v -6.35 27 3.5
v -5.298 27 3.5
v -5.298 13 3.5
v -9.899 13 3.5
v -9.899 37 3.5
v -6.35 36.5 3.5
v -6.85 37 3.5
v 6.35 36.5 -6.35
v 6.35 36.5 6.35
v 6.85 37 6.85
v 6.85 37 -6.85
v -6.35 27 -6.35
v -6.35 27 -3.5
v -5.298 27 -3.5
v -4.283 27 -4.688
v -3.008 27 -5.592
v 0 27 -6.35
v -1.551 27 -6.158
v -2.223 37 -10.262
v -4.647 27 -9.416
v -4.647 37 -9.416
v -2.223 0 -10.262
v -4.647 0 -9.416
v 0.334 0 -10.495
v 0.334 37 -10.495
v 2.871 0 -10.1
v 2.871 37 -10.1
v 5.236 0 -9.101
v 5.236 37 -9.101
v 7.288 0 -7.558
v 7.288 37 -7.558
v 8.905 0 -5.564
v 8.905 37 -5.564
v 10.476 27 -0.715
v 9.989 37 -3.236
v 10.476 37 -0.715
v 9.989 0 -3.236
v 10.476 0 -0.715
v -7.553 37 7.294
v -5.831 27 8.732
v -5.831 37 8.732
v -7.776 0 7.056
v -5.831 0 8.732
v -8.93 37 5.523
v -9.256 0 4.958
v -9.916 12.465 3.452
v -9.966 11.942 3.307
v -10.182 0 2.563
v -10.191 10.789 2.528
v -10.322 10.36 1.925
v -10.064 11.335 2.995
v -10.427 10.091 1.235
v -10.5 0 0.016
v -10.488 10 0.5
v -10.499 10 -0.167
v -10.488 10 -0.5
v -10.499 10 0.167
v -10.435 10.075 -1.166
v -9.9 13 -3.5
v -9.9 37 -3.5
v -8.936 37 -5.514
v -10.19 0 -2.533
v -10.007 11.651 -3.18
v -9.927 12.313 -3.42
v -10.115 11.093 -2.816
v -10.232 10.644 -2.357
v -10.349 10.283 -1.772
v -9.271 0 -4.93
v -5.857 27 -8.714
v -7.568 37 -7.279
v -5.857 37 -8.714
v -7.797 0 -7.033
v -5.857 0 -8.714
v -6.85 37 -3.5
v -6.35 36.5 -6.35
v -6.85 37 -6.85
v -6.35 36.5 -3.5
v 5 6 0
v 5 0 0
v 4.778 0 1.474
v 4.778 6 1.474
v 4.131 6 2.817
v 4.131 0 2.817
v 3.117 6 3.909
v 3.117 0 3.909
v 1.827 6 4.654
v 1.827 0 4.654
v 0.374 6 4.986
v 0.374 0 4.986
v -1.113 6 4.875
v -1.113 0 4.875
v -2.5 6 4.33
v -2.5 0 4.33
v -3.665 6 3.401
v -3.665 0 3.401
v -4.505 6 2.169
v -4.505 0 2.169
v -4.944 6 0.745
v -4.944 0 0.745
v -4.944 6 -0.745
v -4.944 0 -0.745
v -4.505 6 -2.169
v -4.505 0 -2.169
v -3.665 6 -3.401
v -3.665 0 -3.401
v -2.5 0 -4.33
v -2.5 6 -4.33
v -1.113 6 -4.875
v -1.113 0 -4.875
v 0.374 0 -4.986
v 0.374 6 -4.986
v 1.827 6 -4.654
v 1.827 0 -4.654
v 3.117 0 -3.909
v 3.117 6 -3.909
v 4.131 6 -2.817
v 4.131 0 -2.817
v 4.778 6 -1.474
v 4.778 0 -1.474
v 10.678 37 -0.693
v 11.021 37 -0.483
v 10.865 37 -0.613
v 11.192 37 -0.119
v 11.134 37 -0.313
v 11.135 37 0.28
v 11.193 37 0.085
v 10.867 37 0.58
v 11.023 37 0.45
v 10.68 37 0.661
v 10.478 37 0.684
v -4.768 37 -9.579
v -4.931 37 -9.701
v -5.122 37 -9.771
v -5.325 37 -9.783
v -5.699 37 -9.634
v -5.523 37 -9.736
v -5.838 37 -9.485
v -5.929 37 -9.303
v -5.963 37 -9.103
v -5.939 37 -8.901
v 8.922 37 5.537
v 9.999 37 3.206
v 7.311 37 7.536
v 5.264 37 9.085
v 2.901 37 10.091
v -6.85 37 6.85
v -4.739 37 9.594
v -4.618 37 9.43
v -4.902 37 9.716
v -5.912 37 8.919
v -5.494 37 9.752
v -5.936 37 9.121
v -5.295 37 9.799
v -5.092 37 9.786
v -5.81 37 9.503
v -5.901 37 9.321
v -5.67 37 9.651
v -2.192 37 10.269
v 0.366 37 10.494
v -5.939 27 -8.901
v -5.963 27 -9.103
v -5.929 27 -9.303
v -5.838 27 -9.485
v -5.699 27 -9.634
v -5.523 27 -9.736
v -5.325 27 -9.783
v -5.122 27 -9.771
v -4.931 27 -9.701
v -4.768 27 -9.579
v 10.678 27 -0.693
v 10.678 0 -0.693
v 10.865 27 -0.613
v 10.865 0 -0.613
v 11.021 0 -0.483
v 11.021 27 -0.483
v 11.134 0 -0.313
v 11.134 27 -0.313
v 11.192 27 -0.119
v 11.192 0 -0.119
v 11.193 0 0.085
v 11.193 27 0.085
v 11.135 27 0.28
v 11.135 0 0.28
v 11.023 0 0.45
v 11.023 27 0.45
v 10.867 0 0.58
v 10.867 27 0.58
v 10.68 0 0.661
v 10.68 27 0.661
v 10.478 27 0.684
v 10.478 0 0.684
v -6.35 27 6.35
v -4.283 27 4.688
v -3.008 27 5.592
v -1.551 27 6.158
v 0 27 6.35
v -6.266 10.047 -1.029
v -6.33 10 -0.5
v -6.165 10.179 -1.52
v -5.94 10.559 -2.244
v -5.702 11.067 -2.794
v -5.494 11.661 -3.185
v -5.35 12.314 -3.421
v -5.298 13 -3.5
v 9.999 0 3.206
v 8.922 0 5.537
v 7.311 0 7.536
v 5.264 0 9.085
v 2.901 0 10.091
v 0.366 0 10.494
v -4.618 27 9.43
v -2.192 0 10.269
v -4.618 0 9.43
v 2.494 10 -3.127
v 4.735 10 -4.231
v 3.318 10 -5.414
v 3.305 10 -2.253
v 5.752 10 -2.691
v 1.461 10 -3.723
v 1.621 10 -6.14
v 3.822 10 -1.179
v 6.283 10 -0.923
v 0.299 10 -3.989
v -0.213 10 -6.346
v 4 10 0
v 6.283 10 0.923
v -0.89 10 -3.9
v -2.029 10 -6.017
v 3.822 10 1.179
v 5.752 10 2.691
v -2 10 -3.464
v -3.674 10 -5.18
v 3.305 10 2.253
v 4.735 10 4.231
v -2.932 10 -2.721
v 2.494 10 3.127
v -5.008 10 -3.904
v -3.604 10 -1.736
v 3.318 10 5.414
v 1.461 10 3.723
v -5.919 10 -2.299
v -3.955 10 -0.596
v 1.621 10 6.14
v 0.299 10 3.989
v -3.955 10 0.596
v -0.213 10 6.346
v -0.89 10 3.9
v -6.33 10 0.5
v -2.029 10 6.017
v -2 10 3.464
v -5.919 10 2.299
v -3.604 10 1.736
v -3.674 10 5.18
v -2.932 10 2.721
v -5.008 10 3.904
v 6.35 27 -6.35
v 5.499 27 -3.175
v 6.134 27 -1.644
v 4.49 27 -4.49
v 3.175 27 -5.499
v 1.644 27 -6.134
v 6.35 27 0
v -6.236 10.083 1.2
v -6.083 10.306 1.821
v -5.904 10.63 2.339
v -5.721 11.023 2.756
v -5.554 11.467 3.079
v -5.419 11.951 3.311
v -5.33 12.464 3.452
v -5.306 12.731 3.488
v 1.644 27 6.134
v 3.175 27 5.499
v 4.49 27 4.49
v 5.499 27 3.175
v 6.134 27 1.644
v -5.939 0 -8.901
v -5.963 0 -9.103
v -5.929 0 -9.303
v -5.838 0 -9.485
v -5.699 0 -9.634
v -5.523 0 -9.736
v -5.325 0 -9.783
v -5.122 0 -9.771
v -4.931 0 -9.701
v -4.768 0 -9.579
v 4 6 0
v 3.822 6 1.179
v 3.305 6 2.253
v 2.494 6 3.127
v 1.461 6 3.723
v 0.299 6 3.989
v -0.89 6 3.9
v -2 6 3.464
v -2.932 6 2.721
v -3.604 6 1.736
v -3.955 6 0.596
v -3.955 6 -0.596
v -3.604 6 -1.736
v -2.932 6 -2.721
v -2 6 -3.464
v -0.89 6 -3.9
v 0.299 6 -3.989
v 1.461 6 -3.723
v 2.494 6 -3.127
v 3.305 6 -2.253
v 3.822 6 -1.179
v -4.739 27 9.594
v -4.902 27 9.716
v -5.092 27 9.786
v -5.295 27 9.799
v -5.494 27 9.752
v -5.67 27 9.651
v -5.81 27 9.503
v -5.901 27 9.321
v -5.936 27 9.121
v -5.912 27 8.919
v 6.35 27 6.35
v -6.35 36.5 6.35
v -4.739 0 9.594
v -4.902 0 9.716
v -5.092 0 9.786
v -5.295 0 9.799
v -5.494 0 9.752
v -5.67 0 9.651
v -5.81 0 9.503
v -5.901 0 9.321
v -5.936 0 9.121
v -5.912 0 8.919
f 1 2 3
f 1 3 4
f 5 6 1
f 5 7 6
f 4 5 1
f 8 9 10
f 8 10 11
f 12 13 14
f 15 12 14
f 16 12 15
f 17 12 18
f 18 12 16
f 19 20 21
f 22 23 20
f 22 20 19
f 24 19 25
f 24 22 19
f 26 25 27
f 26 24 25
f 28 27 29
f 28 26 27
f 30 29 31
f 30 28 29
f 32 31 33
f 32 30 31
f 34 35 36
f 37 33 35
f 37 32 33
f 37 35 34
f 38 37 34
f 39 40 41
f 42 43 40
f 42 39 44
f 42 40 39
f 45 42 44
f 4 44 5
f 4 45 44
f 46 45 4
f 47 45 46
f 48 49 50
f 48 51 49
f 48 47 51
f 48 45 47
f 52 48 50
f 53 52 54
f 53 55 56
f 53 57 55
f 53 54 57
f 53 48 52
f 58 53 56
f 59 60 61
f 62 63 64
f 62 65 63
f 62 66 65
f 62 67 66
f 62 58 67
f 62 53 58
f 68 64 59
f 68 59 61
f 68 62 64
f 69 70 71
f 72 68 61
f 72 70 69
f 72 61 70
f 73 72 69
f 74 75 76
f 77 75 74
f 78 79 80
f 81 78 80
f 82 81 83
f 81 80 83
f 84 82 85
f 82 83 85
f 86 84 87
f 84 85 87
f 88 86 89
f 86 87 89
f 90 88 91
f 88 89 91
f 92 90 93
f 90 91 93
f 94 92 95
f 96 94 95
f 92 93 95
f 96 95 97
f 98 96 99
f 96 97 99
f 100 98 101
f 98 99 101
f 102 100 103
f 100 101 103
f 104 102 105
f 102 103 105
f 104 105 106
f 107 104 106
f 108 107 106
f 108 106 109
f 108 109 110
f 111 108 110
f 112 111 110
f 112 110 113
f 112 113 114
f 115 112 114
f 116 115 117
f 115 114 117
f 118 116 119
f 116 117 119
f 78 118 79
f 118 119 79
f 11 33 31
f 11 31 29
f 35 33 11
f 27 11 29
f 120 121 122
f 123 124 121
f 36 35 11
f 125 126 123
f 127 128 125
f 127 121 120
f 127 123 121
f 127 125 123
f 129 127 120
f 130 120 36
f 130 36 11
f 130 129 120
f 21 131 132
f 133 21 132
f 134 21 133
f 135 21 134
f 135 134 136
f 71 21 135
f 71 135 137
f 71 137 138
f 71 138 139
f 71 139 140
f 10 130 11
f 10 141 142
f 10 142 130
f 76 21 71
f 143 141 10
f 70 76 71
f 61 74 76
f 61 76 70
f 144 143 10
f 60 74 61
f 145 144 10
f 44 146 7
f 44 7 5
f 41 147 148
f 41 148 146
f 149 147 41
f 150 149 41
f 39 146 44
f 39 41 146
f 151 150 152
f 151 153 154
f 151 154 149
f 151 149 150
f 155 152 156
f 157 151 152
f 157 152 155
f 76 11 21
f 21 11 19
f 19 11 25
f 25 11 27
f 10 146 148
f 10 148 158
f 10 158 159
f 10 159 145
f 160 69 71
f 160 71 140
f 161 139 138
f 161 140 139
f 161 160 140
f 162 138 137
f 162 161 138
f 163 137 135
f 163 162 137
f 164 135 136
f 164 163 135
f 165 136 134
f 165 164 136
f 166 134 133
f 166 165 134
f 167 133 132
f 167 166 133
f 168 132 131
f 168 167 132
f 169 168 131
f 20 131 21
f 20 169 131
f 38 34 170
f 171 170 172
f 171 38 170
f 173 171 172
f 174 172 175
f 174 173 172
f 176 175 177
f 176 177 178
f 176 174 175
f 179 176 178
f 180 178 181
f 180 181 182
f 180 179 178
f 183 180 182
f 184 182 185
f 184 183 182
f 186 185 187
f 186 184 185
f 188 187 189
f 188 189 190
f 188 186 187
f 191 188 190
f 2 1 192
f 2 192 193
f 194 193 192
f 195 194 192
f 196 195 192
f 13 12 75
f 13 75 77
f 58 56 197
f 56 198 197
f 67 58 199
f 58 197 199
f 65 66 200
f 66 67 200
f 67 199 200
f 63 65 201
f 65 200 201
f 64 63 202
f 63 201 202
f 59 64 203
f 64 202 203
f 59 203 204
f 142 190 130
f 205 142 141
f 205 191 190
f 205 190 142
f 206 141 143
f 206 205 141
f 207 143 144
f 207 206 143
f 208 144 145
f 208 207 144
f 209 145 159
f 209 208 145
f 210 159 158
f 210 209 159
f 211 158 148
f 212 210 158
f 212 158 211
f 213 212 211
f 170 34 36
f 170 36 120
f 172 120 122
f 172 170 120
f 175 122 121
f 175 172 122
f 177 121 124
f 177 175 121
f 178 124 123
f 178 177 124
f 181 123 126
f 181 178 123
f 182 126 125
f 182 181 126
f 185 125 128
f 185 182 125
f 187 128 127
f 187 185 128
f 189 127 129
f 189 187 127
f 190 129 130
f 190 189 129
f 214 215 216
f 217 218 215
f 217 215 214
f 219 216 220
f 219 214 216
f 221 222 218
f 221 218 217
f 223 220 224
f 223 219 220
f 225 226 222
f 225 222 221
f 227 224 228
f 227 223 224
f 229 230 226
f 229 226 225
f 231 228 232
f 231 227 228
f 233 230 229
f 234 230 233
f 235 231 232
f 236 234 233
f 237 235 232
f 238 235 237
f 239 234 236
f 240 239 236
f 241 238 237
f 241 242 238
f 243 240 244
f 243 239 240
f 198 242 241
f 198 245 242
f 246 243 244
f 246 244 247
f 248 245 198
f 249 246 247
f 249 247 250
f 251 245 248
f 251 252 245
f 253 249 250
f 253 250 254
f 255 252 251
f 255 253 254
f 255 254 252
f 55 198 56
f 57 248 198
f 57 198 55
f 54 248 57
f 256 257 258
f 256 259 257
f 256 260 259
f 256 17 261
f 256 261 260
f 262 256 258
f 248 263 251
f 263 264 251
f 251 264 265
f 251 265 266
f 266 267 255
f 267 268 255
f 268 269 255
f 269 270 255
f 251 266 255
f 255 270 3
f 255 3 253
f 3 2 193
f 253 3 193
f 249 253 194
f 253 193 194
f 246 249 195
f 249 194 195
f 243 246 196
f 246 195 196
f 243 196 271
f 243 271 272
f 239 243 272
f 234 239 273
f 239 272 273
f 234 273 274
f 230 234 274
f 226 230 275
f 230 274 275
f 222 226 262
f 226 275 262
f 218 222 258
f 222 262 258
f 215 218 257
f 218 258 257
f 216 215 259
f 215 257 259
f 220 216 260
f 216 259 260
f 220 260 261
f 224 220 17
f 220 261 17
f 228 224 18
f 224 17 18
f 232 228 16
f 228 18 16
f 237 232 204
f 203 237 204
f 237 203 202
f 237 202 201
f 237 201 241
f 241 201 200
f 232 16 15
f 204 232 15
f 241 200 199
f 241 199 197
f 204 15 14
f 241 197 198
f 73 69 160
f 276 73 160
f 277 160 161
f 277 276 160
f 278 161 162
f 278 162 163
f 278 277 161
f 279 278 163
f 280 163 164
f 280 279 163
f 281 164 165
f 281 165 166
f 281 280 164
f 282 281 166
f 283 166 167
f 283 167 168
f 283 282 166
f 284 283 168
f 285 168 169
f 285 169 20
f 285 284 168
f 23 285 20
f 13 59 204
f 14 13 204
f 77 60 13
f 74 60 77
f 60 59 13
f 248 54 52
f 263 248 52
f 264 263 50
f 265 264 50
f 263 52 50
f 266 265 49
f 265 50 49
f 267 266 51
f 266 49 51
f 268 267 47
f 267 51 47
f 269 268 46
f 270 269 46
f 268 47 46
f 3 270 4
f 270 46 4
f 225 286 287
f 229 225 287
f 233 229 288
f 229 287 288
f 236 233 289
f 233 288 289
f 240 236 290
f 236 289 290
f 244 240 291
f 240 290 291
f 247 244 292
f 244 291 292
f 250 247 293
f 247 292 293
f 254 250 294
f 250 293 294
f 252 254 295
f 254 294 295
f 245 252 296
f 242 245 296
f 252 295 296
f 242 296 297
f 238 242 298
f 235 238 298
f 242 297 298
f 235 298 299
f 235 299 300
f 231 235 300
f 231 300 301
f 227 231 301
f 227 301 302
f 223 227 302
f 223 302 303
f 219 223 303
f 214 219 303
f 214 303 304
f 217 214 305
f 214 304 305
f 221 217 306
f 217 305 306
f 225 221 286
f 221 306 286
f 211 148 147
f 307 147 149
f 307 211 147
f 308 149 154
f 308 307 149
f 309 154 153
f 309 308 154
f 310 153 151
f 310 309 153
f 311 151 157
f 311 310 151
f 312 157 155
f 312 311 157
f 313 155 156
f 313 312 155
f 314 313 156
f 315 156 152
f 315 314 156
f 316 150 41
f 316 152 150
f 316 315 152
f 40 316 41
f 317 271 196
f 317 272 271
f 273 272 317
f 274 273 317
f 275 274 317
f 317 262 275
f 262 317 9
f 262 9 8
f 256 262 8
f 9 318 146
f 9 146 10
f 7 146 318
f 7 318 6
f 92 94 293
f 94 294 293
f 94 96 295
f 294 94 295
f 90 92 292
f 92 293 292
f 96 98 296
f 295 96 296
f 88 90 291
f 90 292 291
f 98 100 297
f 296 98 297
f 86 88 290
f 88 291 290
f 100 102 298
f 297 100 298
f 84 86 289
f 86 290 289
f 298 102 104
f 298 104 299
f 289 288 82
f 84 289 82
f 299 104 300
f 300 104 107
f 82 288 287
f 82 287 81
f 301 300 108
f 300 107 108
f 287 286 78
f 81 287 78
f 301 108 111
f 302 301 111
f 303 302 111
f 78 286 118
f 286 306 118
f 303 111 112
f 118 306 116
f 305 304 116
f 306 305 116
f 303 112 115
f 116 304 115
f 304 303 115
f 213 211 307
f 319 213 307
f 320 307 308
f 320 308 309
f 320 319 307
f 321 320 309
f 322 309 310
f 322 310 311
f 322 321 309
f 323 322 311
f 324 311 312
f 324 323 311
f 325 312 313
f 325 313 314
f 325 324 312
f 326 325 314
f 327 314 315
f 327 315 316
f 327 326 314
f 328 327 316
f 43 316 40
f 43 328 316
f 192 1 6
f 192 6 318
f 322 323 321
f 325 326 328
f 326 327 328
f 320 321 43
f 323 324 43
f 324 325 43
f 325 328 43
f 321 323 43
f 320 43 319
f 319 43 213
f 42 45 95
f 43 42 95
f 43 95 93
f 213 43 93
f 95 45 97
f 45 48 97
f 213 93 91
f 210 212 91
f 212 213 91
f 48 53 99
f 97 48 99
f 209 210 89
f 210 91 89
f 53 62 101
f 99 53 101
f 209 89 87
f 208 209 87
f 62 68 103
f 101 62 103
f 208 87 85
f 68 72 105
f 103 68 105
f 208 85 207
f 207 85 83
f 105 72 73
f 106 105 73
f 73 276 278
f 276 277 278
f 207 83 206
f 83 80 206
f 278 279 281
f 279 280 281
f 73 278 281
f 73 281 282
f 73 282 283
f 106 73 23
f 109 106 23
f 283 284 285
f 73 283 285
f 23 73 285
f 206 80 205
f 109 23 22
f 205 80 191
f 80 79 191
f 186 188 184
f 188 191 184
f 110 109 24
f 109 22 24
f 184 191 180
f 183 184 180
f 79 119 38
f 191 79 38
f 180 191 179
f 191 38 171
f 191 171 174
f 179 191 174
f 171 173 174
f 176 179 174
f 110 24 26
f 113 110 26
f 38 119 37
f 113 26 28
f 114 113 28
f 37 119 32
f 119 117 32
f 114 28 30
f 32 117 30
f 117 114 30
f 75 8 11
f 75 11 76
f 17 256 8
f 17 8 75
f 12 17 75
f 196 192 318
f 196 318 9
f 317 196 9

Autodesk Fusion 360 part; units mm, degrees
sketch "Sketch1" plane through (0, 0, 0) normal (0, 1, 0) x (1, 0, 0) in component "SwitchSpacer"
  arc A0 (-5.8311, -8.732) -> (-5.8573, 8.7145) centre (0, 0) cw
  arc A1 (-4.6183, -9.4298) -> (-5.8311, -8.732) centre (-5.2363, -9.1011) cw
  line L0 (-20, 3.982) -> (0, 3.982)
  arc A2 (10.4756, 0.7154) -> (10.4777, -0.6839) centre (10.5, 0.0158) cw
  arc A3 (-4.6466, 9.4159) -> (10.4756, 0.7154) centre (0, 0) cw
  arc A4 (10.4777, -0.6839) -> (-4.6183, -9.4298) centre (0, 0) cw
  arc A5 (-5.8573, 8.7145) -> (-4.6466, 9.4159) centre (-5.2637, 9.0854) cw
  line L1 (-20, -4.0237) -> (-20, 3.982)
  circle A6 centre (0, 0) radius 8
  line L2 (0, 3.982) -> (0, -4.0237)
  line L3 (0, -4.0237) -> (-20, -4.0237)
  circle A7 centre (0, 0) radius 5
  circle A8 centre (0, 0) radius 4
  dimension "d8" = 10
  dimension "d9" = 8
extrude "Extrude8" add sketch "Sketch1" along normal blind 27 contours A0 A1 L0 A2 A3 A4 A5 A6 L3 | A0 L0 A6 L3 | L0 A6 L3 A7 | L0 A6 L3 A7 | L0 L2 L3 A7 A8 | L0 L2 L3 A7 A8 in component "SwitchSpacer"
sketch "Sketch2" plane through (0, 27, 0) normal (0, 1, 0) x (-1, 0, 0) in component "SwitchSpacer"
  circle A0 centre (0, 0) radius 4
  line L0 (6.35, 6.35) -> (-6.35, 6.35)
  line L1 (-6.35, 6.35) -> (-6.35, -6.35)
  line L2 (-6.35, -6.35) -> (6.35, -6.35)
  line L3 (6.35, -6.35) -> (6.35, 6.35)
  line L4 (6.35, 6.35) -> (-6.35, -6.35) construction
  line L5 (-6.35, 6.35) -> (6.35, -6.35) construction
  line L6 (6.35, 6.35) -> (19.35, 6.35)
  line L7 (19.35, 6.35) -> (19.35, -6.35)
  line L8 (19.35, -6.35) -> (6.35, -6.35)
  line L9 (6.35, -6.35) -> (6.35, 6.35)
  circle A1 centre (0, 0) radius 6.35
  line L10 (12.5, -3.5) -> (-12.5, -3.5)
  line L11 (-12.5, -3.5) -> (-12.5, 3.5)
  line L12 (-12.5, 3.5) -> (12.5, 3.5)
  line L13 (12.5, 3.5) -> (12.5, -3.5)
  line L14 (12.5, -3.5) -> (-12.5, 3.5) construction
  line L15 (-12.5, -3.5) -> (12.5, 3.5) construction
  arc A2 (5.8573, -8.7145) -> (5.8311, 8.732) centre (0, 0) ccw
  arc A3 (5.8311, 8.732) -> (4.6183, 9.4298) centre (5.2363, 9.1011) ccw
  arc A4 (4.6183, 9.4298) -> (-10.4777, 0.6839) centre (0, 0) ccw
  arc A5 (-10.4777, 0.6839) -> (-10.4756, -0.7154) centre (-10.5, -0.0158) ccw
  arc A6 (-10.4756, -0.7154) -> (4.6466, -9.4159) centre (0, 0) ccw
  arc A7 (4.6466, -9.4159) -> (5.8573, -8.7145) centre (5.2637, -9.0854) ccw
  circle A8 centre (0, 0) radius 4
  dimension "d18" = 12.7
  dimension "d19" = 12.7
  dimension "d20" = 13
  dimension "d21" = 12.7
  dimension "d22" = 12.7
  dimension "d27" = 25
  dimension "d28" = 7
extrude "Extrude9" cut sketch "Sketch1" along normal blind 6 contours L0 L2 L3 A7 A8 | L0 L2 L3 A7 A8 in component "SwitchSpacer"
extrude "Extrude10" add sketch "Sketch2" along normal blind 10 contours L0 L1 L6 L12 A2 A3 A4 | L3 L6 L9 L12 A2 | L1 L2 L8 L10 A2 A6 A7 | L3 L8 L9 L10 A2 | L1 L10 L12 A4 A5 A6 in component "SwitchSpacer"
extrude "Extrude11" cut sketch "Sketch2" against normal blind 17 contours A0 A1 L10 L12 A8 | A0 A1 L12 A8 | A0 A1 L10 A8 | A0 A1 L10 L12 A8 | L3 L9 A1 L12 | L3 L9 A1 L10 | L3 L9 L10 L12 A2 in component "SwitchSpacer"
fillet "Fillet1" radius 3 2 edges at (-7.5989, 10, -3.5) (-7.5989, 10, 3.5) in component "SwitchSpacer"
chamfer "Chamfer1" distance 0.5 angle 45 5 edges at (-6.35, 37, -4.925) (0, 37, -6.35) (-6.35, 37, 4.925) (0, 37, 6.35) (6.35, 37, 0) in component "SwitchSpacer"
component "SwitchSpacer" placed x (1, 0, 0) y (0, 1, 0) z (0, 0, 1) at (0, 0, 0)
